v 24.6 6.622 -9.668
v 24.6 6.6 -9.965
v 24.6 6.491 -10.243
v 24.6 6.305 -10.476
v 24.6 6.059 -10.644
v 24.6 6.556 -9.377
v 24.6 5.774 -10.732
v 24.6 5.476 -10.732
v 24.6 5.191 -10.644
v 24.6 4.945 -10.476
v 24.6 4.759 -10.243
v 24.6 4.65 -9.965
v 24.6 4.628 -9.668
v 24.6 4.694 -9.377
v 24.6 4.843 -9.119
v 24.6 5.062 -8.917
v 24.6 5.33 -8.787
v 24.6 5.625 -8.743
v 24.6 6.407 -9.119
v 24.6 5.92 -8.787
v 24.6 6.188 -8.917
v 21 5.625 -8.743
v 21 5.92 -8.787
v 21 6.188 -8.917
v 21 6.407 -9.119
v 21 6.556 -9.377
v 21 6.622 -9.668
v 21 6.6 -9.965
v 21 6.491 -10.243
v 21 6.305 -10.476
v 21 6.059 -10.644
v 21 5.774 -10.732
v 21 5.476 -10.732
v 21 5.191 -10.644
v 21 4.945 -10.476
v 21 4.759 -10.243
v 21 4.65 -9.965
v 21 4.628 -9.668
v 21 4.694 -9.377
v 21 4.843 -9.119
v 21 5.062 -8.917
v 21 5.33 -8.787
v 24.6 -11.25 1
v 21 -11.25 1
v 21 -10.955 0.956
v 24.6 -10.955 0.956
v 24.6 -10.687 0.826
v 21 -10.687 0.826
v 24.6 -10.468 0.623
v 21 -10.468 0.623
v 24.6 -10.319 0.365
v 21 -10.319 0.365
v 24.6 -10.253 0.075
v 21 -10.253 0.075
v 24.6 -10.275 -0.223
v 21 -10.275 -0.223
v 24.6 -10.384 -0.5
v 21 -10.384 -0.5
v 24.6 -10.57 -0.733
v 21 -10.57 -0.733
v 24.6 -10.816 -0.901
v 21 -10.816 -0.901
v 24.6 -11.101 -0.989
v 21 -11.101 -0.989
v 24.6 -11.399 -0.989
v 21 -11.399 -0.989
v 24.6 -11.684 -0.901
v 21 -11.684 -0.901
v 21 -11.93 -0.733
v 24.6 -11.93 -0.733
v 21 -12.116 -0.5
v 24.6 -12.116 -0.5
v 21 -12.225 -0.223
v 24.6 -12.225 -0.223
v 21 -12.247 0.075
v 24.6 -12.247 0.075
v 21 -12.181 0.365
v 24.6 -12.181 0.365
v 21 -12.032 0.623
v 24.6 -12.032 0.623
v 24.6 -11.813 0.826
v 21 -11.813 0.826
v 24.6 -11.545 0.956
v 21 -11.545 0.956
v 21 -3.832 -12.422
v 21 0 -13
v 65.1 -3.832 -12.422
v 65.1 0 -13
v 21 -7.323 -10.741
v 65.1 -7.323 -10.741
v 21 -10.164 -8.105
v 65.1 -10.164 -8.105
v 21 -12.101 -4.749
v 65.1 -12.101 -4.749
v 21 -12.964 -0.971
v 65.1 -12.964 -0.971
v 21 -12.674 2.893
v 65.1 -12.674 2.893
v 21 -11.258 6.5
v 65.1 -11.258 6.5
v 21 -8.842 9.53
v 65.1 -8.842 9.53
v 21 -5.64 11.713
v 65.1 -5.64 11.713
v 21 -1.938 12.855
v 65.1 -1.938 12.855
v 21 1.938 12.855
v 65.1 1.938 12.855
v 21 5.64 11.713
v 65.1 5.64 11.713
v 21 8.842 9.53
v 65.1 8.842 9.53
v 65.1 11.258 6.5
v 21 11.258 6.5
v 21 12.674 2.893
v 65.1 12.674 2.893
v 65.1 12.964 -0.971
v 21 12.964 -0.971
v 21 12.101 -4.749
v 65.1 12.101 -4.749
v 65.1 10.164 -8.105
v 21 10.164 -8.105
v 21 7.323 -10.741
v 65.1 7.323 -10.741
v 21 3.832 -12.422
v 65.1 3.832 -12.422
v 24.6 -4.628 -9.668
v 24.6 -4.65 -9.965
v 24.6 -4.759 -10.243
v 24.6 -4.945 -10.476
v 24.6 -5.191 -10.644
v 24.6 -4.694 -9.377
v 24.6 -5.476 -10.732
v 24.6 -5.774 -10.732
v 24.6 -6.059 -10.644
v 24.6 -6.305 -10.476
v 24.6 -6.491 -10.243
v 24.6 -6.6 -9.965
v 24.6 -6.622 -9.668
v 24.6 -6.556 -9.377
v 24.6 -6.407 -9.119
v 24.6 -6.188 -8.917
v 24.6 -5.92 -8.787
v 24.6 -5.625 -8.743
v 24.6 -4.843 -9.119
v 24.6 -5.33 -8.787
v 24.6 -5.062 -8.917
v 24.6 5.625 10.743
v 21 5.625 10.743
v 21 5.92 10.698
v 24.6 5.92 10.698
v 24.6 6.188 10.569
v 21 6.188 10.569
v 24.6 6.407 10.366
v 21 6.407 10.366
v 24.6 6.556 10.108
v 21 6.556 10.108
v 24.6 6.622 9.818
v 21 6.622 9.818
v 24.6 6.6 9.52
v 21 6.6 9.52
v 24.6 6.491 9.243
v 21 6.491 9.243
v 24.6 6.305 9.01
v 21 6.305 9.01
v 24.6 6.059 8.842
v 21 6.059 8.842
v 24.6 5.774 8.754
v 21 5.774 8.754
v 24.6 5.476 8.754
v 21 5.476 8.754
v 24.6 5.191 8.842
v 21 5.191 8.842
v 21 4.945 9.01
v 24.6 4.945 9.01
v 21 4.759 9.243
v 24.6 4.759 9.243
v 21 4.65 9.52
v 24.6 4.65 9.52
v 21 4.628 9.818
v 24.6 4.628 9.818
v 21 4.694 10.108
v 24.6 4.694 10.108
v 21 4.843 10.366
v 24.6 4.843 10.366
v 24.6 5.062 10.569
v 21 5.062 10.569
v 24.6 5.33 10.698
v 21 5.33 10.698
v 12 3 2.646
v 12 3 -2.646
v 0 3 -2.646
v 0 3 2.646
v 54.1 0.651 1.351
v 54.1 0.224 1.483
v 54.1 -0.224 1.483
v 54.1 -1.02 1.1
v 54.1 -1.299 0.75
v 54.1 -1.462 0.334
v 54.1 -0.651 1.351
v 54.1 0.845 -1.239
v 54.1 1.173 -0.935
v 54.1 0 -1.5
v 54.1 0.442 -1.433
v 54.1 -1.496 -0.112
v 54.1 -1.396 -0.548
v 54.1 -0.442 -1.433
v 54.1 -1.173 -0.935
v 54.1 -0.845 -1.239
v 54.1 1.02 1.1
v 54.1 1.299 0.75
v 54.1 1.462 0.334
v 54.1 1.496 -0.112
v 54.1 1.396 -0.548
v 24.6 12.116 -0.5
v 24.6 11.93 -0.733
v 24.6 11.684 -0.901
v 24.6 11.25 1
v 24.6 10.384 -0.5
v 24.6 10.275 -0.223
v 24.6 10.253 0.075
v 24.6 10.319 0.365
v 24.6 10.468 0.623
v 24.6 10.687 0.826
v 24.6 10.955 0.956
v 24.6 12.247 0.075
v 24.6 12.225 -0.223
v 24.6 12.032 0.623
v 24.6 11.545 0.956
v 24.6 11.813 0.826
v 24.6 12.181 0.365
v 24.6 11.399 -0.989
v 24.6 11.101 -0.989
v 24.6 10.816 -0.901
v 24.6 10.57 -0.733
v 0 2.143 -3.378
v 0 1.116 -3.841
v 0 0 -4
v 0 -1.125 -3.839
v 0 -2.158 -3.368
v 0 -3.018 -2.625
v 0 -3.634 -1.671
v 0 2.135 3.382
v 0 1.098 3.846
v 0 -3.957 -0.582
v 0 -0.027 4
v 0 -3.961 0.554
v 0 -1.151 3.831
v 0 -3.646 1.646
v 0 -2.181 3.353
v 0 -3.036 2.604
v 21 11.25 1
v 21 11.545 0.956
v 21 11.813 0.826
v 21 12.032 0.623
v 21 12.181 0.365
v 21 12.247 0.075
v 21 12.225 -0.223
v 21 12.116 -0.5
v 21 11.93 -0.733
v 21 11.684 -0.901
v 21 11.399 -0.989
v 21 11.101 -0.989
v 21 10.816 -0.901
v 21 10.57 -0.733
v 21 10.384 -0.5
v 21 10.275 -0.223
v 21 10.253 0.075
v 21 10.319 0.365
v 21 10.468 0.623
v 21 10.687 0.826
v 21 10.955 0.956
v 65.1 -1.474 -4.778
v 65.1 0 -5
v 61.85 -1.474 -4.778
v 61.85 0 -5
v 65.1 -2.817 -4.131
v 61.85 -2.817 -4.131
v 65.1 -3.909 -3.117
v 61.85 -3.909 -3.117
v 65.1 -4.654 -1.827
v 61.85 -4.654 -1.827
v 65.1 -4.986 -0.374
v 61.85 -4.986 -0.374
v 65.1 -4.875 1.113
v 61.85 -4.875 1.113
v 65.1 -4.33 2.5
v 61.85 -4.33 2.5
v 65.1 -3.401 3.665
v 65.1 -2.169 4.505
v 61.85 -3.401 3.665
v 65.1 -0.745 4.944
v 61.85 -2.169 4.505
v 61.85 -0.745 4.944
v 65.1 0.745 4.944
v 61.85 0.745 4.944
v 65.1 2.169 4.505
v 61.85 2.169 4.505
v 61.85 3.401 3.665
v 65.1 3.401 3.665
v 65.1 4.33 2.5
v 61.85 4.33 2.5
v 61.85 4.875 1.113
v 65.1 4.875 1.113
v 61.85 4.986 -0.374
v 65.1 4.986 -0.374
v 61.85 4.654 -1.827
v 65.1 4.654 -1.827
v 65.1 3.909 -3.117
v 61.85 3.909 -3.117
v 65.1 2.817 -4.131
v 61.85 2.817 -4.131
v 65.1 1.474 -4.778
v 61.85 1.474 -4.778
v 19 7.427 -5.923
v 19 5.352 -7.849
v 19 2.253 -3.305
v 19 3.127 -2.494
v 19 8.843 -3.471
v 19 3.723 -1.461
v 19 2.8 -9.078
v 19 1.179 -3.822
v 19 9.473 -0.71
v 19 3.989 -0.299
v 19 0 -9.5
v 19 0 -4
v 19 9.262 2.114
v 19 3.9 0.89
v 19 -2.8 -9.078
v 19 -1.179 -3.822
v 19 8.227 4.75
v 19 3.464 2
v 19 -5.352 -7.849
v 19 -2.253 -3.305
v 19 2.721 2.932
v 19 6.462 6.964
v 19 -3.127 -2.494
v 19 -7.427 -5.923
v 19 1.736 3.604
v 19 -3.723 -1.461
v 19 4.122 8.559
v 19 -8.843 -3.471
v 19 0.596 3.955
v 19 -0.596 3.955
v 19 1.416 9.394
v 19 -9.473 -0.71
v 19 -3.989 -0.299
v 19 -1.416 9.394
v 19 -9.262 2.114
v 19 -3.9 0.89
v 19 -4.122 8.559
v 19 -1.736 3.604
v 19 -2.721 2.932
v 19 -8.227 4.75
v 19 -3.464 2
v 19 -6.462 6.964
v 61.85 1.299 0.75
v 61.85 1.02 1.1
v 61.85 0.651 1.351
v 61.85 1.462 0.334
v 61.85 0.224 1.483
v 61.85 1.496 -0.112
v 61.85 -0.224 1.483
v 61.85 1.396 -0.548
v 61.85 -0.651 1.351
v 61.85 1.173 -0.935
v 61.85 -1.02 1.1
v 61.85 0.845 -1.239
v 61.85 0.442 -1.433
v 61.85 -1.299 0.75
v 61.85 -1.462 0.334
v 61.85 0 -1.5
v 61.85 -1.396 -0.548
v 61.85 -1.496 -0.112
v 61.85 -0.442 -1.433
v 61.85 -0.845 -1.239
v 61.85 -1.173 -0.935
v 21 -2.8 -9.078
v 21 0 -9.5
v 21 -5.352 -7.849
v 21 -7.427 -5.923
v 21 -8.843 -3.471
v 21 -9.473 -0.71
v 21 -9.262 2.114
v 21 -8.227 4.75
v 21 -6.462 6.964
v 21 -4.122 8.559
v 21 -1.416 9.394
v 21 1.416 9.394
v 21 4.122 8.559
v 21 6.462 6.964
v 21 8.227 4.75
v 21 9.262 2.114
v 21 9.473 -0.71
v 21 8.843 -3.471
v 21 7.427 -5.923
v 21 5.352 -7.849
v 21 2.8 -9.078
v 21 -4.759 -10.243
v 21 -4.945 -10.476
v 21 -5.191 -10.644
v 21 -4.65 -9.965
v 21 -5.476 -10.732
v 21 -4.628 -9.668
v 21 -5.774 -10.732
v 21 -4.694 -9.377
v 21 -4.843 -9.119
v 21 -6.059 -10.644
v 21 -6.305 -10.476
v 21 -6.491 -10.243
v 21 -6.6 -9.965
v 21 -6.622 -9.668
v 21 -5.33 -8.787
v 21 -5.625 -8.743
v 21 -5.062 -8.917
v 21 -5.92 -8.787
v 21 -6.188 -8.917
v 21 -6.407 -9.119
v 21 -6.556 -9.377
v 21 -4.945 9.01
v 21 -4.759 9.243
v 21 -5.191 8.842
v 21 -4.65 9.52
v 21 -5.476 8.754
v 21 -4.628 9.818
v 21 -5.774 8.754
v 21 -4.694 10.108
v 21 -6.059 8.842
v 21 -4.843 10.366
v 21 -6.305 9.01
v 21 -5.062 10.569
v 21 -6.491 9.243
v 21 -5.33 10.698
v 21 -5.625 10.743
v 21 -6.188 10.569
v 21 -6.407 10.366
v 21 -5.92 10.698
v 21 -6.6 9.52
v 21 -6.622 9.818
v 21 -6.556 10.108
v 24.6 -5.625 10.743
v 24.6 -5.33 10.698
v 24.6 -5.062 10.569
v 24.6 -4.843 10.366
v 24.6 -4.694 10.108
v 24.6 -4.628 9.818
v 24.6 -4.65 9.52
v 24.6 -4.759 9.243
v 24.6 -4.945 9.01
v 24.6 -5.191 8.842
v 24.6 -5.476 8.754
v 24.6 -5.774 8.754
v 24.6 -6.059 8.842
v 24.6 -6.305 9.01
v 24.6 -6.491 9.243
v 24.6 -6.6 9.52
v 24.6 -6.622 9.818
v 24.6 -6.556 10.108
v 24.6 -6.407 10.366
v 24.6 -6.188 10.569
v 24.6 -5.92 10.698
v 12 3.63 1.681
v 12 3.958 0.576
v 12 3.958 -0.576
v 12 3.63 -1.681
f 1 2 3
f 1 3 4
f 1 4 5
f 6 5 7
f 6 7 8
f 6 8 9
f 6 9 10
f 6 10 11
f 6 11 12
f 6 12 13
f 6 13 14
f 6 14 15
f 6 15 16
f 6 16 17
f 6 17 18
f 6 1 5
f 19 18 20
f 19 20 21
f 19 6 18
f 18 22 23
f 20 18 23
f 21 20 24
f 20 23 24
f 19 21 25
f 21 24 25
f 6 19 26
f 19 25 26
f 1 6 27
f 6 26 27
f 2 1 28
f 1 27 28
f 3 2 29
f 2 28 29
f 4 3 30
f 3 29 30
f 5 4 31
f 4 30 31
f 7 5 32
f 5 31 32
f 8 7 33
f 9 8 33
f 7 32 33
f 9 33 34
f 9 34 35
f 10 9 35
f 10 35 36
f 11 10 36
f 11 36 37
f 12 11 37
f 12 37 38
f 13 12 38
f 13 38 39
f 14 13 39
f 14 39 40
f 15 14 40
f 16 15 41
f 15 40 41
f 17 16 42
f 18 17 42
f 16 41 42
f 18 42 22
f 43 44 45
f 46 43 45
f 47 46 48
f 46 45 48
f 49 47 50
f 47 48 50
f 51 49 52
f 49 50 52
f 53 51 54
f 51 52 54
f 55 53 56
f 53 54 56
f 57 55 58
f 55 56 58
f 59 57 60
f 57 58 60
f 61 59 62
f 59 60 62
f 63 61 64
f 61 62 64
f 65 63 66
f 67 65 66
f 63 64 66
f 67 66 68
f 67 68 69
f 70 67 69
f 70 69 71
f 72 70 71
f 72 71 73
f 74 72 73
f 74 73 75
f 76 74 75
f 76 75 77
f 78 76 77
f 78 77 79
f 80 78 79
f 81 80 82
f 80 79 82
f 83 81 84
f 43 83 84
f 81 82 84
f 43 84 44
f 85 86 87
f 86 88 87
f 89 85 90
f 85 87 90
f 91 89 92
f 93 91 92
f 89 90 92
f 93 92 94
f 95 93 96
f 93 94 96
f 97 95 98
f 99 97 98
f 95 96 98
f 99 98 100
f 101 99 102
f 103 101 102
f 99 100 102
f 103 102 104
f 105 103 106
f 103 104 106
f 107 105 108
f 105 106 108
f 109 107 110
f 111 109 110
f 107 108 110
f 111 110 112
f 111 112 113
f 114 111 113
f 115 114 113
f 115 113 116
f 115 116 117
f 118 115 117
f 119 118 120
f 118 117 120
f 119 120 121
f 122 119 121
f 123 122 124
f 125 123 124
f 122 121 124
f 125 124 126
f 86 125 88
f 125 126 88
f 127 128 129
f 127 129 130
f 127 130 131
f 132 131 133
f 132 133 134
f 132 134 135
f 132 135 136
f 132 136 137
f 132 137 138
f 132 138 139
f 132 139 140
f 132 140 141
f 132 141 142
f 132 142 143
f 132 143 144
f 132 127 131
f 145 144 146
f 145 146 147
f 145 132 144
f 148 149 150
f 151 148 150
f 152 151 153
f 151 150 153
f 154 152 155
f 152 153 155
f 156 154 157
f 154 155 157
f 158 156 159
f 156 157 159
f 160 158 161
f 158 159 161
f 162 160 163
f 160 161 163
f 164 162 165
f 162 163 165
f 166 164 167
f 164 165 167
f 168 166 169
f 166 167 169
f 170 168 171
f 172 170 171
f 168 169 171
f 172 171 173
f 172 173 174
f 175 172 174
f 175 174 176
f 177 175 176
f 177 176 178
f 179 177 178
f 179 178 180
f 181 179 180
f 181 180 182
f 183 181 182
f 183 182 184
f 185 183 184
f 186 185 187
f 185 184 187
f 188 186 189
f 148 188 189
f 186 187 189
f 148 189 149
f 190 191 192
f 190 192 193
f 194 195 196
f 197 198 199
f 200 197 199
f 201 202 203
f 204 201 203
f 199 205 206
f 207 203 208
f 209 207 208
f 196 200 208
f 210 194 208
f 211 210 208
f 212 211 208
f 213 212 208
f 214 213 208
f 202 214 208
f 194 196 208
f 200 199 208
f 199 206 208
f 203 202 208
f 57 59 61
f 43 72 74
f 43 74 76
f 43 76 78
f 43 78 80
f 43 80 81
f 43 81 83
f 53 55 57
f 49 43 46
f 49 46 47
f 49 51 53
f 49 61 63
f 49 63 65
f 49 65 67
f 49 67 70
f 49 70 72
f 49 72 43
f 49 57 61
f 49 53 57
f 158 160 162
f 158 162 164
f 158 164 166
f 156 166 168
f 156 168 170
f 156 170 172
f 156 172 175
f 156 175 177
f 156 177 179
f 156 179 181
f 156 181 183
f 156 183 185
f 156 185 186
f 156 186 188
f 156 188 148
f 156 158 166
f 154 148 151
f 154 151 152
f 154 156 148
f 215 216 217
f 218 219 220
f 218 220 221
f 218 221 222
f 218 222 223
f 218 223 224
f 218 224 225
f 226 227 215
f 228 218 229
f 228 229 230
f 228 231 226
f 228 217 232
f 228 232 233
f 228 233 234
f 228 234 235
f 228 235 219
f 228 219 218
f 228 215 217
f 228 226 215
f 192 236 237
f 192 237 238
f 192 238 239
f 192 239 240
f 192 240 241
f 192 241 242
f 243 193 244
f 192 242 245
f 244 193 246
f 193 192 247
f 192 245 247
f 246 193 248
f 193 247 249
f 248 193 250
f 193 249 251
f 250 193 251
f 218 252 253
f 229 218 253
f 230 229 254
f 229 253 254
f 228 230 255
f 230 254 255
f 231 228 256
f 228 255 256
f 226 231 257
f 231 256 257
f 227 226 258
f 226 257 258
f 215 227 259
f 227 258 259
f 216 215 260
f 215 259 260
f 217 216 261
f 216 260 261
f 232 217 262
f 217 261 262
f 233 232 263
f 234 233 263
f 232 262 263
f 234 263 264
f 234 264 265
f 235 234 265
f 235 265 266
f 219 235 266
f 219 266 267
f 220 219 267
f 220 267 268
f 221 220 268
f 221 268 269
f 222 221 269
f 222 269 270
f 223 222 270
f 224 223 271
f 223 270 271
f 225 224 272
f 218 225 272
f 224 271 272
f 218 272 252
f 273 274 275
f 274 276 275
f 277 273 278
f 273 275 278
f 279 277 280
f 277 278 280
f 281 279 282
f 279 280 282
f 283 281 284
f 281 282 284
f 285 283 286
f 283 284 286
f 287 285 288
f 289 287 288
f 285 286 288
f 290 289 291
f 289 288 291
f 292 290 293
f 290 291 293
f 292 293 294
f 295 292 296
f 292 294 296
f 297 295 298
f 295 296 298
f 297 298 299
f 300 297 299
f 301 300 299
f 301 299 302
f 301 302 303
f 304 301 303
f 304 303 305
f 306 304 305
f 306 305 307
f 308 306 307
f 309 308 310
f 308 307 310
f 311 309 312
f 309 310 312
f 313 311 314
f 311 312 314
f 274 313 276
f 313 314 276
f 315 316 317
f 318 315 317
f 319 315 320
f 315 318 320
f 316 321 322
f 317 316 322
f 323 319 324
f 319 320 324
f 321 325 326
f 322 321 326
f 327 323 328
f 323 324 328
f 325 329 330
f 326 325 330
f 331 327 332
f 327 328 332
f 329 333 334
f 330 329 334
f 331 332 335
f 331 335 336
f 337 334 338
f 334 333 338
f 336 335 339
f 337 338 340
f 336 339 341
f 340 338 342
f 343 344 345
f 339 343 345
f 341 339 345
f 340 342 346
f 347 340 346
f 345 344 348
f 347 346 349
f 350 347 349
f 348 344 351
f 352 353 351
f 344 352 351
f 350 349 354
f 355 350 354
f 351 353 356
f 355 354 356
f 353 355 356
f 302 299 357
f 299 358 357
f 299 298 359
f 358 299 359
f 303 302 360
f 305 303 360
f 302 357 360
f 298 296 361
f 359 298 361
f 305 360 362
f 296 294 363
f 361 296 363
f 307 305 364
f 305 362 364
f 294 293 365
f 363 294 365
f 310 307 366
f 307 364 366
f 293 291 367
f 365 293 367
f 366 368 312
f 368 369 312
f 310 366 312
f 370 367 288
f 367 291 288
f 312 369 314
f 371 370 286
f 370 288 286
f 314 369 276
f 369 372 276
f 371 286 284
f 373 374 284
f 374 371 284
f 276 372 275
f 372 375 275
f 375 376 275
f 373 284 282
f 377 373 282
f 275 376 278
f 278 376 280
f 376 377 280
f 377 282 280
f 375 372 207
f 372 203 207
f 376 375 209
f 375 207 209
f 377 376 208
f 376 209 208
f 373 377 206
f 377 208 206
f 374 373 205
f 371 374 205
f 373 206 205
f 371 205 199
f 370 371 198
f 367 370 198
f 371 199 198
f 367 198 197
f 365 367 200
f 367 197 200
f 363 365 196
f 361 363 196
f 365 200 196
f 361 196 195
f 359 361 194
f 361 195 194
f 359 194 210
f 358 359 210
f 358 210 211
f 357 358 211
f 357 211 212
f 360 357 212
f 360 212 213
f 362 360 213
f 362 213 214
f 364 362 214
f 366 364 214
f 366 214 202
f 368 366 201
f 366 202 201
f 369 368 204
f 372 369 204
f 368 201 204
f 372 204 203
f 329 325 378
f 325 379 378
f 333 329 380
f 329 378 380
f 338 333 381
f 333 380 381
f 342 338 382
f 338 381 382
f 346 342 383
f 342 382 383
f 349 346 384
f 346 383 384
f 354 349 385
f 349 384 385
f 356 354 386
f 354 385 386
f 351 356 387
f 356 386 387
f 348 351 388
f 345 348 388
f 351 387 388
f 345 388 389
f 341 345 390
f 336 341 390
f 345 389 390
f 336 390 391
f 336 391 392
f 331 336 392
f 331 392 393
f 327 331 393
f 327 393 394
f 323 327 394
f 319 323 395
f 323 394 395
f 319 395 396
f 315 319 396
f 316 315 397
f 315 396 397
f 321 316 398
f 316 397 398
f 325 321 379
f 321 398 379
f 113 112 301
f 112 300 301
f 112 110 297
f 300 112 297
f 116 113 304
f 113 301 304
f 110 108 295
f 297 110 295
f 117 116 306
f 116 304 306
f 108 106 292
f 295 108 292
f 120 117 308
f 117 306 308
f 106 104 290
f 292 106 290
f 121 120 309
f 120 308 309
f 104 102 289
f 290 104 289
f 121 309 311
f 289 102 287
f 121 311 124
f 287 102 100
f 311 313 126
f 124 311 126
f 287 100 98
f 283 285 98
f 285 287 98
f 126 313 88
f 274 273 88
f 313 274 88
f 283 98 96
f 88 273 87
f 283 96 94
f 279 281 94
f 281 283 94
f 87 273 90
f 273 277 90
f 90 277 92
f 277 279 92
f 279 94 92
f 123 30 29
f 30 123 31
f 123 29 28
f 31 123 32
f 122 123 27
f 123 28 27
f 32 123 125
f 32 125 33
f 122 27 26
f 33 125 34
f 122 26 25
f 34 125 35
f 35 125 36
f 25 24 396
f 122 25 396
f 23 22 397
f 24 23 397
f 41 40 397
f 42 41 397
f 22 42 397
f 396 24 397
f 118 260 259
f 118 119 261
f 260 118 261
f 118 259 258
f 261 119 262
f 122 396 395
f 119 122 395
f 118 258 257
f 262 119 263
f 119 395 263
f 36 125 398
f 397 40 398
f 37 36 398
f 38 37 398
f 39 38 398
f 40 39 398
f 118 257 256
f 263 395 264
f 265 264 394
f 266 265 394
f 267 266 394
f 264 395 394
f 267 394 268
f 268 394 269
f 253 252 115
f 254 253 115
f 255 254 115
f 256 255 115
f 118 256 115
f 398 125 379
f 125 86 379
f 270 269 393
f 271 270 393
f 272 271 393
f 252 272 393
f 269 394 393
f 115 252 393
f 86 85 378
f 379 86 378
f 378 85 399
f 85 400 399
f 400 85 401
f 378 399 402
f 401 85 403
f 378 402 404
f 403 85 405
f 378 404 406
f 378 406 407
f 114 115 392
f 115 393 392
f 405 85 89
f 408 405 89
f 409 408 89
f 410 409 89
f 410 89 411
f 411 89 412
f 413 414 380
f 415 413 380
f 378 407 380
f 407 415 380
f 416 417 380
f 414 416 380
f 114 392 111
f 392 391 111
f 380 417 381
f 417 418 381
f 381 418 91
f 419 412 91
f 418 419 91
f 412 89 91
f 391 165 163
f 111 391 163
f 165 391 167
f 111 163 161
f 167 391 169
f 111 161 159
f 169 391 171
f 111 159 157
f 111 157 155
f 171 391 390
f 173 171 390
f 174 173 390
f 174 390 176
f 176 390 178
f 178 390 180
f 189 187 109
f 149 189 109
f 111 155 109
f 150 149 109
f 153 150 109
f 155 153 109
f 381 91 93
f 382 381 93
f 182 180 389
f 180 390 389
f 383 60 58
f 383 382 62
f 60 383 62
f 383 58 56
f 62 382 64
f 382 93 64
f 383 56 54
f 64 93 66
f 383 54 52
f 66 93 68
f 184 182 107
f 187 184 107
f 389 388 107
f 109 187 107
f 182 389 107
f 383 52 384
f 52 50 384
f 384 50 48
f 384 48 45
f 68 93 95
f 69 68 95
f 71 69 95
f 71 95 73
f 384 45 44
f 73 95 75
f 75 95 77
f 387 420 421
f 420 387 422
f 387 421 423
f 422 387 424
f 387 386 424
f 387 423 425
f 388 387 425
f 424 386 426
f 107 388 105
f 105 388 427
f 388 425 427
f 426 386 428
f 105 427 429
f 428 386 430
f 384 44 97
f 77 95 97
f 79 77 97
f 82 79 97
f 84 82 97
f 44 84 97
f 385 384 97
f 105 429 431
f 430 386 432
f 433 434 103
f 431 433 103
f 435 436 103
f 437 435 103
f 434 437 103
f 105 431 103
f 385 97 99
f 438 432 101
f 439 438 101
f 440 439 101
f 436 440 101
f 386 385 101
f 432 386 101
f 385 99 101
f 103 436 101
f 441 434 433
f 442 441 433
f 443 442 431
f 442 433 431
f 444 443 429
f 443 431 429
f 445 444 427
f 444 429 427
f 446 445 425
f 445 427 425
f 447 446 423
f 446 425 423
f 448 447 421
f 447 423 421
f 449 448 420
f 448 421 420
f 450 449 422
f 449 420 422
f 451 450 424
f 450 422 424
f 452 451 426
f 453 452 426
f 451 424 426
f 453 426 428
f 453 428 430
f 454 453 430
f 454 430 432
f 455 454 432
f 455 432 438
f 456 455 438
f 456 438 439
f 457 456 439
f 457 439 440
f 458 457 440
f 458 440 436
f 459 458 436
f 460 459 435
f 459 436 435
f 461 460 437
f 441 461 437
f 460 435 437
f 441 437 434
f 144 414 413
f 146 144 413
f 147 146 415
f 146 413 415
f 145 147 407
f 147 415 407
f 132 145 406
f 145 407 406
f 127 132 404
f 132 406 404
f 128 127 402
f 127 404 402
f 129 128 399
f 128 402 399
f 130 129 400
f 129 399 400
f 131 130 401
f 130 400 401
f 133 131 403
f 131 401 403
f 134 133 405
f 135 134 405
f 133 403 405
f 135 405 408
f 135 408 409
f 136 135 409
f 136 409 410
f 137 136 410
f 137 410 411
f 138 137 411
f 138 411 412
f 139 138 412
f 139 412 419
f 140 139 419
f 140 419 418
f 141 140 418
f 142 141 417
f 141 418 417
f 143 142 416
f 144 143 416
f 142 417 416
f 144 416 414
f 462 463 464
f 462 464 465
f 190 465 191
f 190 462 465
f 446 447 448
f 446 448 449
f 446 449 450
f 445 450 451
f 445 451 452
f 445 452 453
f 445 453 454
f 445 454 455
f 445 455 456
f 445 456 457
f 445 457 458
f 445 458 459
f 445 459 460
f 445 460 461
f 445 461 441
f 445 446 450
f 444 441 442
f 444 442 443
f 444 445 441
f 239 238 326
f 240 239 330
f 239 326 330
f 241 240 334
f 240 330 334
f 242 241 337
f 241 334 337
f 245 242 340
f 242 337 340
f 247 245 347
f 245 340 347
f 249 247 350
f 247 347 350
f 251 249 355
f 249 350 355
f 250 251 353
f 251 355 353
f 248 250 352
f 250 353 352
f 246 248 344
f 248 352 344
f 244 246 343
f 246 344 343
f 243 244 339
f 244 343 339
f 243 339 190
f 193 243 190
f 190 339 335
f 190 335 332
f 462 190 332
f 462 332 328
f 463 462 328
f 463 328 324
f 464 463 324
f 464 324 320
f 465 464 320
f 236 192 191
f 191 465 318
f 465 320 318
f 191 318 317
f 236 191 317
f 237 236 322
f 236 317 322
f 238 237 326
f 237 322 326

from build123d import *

# Parameters (mm, degrees)
SZKIC2_R                   = 1
WYTNIJ_WYCI_GNI_CIE1_DEPTH = 3.6
WYTNIJ_WYCI_GNI_CIE2_START = -12
WYTNIJ_WYCI_GNI_CIE2_DEPTH = 12


with BuildPart() as part:
    # Szkic1 → Obrót1 (revolve)
    with BuildSketch(Plane.XY, mode=Mode.PRIVATE) as obr_t1_sk:
        Polygon((0, 0), (0, 4), (19, 4), (19, 9.5), (21, 9.5), (21, 13), (65.1, 13), (65.1, 5), (61.85, 5), (61.85, 1.5), (54.1, 1.5), (54.1, 0), align=None)
    revolve(obr_t1_sk.sketch.rotate(Axis((0, 0, 0), (-1, 0, 0)), 90), axis=Axis((0, 0, 0), (-1, 0, 0)))

    # Szkic2 → Wytnij-wyciągnięcie1 (cut)
    with BuildSketch(Plane.ZY.offset(-21)):
        with Locations((0, 11.25)):
            Circle(SZKIC2_R)
        with Locations((9.742785793, 5.625)):
            Circle(SZKIC2_R)
        with Locations((9.742785793, -5.625)):
            Circle(SZKIC2_R)
        with Locations((0, -11.25)):
            Circle(SZKIC2_R)
        with Locations((-9.742785793, -5.625)):
            Circle(SZKIC2_R)
        with Locations((-9.742785793, 5.625)):
            Circle(SZKIC2_R)
    extrude(amount=-WYTNIJ_WYCI_GNI_CIE1_DEPTH, mode=Mode.SUBTRACT)

    # Szkic3 → Wytnij-wyciągnięcie2 (cut)
    with BuildSketch(Plane.ZY.offset(WYTNIJ_WYCI_GNI_CIE2_START)):
        with BuildLine():
            Line((-2.645751311, 3), (2.645751311, 3))
            ThreePointArc((2.645751311, 3), (0, 4), (-2.645751311, 3))
        make_face()
    extrude(amount=WYTNIJ_WYCI_GNI_CIE2_DEPTH, mode=Mode.SUBTRACT)


solid = part.part
